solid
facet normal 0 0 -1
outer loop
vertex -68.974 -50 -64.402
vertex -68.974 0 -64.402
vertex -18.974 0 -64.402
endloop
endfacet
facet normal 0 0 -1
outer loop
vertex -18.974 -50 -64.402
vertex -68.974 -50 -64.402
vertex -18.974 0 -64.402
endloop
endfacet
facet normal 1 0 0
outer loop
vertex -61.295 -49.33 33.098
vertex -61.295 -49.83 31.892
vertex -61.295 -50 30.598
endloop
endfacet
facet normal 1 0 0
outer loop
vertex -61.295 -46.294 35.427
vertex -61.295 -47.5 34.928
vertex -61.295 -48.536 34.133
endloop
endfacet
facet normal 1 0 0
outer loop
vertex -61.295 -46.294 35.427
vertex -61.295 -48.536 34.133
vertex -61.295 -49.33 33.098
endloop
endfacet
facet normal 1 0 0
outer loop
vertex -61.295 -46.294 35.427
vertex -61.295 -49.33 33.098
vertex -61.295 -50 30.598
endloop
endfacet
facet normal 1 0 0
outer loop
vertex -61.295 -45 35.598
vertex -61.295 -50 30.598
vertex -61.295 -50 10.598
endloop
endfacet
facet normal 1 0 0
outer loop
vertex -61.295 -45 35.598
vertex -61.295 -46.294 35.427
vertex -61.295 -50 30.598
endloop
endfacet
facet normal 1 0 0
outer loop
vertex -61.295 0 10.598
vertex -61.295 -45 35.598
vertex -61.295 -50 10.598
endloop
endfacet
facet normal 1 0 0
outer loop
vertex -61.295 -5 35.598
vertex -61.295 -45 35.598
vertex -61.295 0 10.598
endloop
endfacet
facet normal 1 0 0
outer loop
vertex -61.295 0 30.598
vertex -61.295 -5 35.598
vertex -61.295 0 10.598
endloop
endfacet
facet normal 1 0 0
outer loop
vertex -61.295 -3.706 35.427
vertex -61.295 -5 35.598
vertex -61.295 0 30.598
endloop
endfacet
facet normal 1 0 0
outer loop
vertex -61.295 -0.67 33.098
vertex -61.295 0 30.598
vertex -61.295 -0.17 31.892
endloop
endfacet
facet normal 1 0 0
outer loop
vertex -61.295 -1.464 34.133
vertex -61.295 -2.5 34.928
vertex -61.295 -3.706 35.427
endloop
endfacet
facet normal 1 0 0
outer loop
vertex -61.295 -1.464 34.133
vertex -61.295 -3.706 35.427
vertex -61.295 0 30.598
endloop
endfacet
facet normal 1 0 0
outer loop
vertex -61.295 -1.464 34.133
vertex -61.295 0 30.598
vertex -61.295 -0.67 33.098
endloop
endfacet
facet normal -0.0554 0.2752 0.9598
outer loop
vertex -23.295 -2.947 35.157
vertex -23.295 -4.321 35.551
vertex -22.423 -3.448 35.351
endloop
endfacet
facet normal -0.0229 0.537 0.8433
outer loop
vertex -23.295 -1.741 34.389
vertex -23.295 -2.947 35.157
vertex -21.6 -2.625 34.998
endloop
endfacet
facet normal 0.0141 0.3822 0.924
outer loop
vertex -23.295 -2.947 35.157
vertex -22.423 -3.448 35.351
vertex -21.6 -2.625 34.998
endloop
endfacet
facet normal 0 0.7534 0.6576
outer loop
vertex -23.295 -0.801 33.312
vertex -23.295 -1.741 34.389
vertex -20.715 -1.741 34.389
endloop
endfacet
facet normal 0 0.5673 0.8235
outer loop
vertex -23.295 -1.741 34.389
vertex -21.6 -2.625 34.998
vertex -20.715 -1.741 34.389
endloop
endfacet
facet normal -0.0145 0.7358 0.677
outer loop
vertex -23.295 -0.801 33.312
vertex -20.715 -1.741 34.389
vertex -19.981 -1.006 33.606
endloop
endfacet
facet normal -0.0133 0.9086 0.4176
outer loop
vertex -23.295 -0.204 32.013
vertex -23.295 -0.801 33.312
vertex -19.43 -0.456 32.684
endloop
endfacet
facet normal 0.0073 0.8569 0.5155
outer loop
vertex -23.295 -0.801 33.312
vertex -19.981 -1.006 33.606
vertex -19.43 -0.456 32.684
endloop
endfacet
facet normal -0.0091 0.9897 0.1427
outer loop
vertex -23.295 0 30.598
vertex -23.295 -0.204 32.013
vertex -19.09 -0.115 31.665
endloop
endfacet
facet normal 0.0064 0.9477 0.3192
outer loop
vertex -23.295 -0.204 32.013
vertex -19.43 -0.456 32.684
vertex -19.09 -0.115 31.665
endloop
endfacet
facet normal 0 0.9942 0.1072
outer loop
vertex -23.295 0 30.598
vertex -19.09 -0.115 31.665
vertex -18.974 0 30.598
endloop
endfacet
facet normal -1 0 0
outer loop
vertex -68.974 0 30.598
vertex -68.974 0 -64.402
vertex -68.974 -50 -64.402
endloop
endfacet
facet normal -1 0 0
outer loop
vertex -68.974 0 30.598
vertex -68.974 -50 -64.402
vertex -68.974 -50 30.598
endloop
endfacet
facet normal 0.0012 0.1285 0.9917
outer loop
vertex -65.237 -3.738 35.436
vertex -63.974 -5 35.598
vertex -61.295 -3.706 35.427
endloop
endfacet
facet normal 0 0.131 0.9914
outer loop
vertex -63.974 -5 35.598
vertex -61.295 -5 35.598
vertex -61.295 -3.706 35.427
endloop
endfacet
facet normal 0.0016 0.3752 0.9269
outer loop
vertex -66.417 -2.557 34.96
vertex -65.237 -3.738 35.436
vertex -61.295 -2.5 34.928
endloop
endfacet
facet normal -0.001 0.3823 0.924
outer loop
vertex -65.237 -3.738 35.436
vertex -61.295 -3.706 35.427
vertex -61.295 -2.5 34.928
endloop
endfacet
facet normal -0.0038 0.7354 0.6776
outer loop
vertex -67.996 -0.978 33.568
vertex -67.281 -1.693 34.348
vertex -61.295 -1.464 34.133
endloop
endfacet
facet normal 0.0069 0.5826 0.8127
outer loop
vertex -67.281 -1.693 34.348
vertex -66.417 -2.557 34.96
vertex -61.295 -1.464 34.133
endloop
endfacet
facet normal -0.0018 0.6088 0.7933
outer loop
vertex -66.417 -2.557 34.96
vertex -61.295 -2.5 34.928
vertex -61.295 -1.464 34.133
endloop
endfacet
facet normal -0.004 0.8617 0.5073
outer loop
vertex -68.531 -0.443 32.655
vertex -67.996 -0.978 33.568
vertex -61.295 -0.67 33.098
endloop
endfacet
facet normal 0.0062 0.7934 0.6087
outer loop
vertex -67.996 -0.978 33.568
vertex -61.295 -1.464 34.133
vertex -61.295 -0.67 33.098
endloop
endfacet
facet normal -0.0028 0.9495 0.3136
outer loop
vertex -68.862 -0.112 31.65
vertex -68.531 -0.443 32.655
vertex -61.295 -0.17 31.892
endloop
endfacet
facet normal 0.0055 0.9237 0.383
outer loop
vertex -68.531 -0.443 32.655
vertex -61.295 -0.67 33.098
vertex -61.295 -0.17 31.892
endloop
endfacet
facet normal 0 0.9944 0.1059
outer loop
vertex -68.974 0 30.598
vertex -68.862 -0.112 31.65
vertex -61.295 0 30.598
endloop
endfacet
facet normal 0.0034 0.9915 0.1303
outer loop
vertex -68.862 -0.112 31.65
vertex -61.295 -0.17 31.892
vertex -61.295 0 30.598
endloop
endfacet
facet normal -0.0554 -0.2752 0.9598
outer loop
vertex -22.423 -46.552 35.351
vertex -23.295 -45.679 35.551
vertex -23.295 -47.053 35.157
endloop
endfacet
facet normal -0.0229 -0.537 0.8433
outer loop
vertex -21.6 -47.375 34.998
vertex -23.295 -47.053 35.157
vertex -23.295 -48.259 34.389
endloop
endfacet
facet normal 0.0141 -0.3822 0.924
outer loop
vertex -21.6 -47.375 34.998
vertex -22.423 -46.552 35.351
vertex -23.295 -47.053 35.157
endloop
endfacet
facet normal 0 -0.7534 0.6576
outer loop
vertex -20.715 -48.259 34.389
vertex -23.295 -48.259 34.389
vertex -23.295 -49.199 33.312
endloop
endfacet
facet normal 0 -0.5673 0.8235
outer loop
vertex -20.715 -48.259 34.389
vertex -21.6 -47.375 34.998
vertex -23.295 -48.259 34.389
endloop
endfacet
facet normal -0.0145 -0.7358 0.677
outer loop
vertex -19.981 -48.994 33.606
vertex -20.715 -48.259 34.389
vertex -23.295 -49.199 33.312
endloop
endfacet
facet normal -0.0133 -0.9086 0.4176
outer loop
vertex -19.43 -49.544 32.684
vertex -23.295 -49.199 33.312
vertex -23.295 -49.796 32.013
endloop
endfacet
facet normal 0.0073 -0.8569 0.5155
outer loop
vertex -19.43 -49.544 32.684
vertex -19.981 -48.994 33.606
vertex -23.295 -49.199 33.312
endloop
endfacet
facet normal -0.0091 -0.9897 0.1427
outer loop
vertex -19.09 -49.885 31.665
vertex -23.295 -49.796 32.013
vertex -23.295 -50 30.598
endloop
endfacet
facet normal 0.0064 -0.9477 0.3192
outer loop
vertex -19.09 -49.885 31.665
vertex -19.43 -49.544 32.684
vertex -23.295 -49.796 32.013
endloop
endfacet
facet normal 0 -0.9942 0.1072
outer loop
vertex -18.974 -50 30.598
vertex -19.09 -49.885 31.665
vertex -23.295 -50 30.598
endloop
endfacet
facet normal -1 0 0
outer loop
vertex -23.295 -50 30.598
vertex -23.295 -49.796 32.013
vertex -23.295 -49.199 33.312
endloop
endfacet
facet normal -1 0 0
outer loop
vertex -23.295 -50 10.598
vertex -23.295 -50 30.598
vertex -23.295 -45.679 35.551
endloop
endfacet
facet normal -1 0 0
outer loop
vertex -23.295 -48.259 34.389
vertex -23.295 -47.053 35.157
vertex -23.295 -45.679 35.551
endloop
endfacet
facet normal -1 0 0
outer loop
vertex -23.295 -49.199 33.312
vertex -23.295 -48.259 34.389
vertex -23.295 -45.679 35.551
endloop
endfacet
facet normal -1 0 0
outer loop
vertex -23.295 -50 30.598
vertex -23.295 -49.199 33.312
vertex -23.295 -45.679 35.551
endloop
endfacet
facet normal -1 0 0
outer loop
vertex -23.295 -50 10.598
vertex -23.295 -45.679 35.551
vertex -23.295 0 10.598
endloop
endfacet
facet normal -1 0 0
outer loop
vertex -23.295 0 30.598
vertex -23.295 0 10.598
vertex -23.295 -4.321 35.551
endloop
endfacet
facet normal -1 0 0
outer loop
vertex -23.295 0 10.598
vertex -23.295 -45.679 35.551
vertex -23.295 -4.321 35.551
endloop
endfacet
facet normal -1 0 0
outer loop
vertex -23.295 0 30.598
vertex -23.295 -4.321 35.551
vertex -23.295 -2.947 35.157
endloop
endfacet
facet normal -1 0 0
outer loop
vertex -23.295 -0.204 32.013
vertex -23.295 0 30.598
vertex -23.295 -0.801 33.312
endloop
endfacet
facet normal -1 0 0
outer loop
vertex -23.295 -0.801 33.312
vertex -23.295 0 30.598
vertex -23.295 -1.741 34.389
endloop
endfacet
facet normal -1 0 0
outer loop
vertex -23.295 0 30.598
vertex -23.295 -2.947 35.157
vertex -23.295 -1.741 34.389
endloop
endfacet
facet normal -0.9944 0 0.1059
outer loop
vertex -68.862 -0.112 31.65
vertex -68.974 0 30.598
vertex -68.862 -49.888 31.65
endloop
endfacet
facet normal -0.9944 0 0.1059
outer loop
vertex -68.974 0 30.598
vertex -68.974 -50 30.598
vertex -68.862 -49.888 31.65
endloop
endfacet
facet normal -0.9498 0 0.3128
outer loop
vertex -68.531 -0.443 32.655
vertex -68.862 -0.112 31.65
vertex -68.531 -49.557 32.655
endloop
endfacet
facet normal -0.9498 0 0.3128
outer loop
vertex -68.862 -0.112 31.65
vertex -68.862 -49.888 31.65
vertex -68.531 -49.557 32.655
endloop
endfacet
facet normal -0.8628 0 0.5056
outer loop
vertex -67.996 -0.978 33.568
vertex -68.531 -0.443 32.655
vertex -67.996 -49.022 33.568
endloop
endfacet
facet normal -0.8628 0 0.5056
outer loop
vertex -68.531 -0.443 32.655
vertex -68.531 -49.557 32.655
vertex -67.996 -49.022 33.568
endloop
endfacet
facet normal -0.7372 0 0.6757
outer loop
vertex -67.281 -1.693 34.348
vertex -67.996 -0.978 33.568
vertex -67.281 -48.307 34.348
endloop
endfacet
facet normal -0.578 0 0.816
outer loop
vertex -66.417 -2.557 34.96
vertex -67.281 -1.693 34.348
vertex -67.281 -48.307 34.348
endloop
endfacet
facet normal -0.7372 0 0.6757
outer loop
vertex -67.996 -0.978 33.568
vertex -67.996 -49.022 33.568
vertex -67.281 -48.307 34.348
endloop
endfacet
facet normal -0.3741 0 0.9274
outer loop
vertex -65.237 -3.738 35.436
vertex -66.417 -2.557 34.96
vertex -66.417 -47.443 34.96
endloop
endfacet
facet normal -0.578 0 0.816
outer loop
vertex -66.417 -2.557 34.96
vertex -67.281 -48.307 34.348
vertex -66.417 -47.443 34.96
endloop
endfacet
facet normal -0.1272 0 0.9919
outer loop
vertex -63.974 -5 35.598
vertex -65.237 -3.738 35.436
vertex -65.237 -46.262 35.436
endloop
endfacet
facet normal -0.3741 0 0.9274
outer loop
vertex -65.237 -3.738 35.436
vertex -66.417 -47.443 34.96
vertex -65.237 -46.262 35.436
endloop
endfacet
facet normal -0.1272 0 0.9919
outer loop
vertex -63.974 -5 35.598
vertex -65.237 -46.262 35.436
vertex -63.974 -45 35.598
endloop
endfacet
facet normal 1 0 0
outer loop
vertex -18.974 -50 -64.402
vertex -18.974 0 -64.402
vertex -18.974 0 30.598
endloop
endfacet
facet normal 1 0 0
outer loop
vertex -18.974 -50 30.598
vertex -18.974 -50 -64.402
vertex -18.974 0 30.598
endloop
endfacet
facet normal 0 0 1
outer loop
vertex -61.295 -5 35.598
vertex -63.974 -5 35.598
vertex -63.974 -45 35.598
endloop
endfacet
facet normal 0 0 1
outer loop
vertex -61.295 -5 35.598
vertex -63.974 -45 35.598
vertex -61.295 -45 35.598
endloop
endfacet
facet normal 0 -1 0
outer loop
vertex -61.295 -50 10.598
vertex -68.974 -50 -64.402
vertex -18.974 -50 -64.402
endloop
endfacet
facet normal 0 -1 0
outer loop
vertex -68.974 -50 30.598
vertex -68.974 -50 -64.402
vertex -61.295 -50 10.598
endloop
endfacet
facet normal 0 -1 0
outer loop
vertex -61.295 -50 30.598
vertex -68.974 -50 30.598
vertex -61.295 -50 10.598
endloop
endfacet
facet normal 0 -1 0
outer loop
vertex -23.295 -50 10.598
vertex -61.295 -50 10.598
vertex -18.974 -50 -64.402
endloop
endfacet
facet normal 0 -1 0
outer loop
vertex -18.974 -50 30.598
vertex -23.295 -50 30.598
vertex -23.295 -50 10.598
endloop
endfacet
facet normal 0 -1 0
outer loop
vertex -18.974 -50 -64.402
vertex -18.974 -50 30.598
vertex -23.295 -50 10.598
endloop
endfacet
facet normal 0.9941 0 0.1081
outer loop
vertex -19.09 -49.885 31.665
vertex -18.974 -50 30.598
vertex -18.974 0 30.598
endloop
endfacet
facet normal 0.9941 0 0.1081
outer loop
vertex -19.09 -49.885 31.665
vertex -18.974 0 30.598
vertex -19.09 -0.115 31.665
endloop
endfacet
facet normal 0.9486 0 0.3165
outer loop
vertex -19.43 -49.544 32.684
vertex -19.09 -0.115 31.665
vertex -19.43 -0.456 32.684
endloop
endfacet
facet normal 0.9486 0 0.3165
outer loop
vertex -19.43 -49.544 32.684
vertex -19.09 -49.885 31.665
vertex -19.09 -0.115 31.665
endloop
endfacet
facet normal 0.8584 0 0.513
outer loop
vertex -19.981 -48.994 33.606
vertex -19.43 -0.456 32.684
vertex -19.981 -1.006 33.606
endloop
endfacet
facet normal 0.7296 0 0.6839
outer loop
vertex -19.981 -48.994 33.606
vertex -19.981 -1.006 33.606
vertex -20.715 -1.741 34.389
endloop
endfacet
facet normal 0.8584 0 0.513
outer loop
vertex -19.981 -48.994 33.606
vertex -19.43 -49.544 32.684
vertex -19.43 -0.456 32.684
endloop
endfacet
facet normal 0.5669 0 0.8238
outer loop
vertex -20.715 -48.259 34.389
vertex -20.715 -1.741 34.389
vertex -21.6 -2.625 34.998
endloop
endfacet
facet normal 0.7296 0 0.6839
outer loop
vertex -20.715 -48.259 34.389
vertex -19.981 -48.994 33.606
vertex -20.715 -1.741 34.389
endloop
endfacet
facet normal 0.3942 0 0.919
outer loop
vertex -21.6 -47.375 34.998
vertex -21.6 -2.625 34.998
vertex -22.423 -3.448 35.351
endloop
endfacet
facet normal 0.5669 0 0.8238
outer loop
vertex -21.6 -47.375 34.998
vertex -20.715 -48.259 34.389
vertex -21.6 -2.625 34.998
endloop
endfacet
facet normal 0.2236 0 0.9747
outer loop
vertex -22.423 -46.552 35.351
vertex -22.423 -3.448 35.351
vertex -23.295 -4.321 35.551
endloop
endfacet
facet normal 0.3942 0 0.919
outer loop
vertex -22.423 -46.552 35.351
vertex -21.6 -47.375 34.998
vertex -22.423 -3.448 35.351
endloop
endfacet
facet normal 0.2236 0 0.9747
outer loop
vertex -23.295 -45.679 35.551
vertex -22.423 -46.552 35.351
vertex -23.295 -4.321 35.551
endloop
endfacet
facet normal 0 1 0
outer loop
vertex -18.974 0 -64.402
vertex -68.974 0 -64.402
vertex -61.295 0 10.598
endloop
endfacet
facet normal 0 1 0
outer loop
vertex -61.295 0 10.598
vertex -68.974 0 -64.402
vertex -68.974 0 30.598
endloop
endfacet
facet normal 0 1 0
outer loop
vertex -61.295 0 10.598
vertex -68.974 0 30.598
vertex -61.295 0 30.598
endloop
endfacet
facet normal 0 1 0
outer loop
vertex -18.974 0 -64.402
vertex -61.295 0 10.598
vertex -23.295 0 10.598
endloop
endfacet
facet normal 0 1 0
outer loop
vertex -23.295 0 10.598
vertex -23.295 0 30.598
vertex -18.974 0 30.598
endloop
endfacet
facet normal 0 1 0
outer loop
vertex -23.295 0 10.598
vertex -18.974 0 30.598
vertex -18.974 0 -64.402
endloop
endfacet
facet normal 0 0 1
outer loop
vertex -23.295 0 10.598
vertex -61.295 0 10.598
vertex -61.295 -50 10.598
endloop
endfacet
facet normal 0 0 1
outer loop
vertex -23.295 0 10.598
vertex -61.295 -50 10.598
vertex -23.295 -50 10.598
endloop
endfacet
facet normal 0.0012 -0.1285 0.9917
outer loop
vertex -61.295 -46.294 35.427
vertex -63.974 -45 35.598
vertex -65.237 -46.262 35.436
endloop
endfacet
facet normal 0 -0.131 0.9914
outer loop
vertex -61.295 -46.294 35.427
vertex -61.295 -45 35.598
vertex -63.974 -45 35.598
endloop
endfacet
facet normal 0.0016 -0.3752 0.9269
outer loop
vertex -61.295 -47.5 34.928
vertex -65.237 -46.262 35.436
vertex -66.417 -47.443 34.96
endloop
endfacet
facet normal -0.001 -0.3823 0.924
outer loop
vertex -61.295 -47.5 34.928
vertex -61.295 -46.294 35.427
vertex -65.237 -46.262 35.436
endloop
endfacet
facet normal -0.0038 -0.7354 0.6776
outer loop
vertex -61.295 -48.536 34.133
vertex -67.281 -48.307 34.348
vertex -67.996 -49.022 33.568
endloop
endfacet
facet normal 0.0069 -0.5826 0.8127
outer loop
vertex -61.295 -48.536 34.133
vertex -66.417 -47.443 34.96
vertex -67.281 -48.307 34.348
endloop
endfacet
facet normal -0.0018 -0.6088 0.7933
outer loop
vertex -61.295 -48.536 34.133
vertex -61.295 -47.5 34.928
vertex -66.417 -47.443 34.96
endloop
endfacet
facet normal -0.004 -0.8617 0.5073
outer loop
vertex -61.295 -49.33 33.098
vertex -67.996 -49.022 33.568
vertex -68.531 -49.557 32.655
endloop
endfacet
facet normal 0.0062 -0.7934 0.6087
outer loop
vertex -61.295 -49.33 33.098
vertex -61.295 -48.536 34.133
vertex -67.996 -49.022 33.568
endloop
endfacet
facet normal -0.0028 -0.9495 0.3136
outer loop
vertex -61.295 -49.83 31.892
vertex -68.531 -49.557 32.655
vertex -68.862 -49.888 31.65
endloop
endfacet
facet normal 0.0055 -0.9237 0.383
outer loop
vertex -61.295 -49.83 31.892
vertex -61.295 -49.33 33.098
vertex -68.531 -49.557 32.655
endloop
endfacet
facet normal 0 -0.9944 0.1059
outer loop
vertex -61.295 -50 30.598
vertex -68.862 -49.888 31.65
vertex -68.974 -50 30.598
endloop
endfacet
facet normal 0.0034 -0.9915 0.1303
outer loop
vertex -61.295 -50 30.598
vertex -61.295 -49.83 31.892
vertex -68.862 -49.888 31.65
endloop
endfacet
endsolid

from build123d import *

# Parameters (mm, degrees)
F0_W     = 50
F0_H     = 100
F1_DEPTH = 50
F2_R     = 5
F4_W     = 38
F4_H     = 53.0364588497
F5_DEPTH = 25


with BuildPart() as f1:
    # F0 (on Front) → F1 (new body)
    with BuildSketch(Plane.XZ):
        with Locations((-43.9743227283, -14.4022647291)):
            Rectangle(F0_W, F0_H)
    extrude(amount=F1_DEPTH)

    # F2
    f2_edges = [f1.edges().sort_by_distance(p)[0] for p in [
        (-18.974323, -25, 35.597735),
        (-68.974323, -25, 35.597735),
        (-43.974323, 0, 35.597735),
        (-43.974323, -50, 35.597735),
    ]]
    fillet(f2_edges, radius=F2_R)

    # F4 (on face) → F5 (cut)
    with BuildSketch(Plane.XY.offset(35.5977352709)):
        with Locations((-42.2953676743, -26.5182294249)):
            Rectangle(F4_W, F4_H)
    extrude(amount=-F5_DEPTH, mode=Mode.SUBTRACT)


solid = f1.part
